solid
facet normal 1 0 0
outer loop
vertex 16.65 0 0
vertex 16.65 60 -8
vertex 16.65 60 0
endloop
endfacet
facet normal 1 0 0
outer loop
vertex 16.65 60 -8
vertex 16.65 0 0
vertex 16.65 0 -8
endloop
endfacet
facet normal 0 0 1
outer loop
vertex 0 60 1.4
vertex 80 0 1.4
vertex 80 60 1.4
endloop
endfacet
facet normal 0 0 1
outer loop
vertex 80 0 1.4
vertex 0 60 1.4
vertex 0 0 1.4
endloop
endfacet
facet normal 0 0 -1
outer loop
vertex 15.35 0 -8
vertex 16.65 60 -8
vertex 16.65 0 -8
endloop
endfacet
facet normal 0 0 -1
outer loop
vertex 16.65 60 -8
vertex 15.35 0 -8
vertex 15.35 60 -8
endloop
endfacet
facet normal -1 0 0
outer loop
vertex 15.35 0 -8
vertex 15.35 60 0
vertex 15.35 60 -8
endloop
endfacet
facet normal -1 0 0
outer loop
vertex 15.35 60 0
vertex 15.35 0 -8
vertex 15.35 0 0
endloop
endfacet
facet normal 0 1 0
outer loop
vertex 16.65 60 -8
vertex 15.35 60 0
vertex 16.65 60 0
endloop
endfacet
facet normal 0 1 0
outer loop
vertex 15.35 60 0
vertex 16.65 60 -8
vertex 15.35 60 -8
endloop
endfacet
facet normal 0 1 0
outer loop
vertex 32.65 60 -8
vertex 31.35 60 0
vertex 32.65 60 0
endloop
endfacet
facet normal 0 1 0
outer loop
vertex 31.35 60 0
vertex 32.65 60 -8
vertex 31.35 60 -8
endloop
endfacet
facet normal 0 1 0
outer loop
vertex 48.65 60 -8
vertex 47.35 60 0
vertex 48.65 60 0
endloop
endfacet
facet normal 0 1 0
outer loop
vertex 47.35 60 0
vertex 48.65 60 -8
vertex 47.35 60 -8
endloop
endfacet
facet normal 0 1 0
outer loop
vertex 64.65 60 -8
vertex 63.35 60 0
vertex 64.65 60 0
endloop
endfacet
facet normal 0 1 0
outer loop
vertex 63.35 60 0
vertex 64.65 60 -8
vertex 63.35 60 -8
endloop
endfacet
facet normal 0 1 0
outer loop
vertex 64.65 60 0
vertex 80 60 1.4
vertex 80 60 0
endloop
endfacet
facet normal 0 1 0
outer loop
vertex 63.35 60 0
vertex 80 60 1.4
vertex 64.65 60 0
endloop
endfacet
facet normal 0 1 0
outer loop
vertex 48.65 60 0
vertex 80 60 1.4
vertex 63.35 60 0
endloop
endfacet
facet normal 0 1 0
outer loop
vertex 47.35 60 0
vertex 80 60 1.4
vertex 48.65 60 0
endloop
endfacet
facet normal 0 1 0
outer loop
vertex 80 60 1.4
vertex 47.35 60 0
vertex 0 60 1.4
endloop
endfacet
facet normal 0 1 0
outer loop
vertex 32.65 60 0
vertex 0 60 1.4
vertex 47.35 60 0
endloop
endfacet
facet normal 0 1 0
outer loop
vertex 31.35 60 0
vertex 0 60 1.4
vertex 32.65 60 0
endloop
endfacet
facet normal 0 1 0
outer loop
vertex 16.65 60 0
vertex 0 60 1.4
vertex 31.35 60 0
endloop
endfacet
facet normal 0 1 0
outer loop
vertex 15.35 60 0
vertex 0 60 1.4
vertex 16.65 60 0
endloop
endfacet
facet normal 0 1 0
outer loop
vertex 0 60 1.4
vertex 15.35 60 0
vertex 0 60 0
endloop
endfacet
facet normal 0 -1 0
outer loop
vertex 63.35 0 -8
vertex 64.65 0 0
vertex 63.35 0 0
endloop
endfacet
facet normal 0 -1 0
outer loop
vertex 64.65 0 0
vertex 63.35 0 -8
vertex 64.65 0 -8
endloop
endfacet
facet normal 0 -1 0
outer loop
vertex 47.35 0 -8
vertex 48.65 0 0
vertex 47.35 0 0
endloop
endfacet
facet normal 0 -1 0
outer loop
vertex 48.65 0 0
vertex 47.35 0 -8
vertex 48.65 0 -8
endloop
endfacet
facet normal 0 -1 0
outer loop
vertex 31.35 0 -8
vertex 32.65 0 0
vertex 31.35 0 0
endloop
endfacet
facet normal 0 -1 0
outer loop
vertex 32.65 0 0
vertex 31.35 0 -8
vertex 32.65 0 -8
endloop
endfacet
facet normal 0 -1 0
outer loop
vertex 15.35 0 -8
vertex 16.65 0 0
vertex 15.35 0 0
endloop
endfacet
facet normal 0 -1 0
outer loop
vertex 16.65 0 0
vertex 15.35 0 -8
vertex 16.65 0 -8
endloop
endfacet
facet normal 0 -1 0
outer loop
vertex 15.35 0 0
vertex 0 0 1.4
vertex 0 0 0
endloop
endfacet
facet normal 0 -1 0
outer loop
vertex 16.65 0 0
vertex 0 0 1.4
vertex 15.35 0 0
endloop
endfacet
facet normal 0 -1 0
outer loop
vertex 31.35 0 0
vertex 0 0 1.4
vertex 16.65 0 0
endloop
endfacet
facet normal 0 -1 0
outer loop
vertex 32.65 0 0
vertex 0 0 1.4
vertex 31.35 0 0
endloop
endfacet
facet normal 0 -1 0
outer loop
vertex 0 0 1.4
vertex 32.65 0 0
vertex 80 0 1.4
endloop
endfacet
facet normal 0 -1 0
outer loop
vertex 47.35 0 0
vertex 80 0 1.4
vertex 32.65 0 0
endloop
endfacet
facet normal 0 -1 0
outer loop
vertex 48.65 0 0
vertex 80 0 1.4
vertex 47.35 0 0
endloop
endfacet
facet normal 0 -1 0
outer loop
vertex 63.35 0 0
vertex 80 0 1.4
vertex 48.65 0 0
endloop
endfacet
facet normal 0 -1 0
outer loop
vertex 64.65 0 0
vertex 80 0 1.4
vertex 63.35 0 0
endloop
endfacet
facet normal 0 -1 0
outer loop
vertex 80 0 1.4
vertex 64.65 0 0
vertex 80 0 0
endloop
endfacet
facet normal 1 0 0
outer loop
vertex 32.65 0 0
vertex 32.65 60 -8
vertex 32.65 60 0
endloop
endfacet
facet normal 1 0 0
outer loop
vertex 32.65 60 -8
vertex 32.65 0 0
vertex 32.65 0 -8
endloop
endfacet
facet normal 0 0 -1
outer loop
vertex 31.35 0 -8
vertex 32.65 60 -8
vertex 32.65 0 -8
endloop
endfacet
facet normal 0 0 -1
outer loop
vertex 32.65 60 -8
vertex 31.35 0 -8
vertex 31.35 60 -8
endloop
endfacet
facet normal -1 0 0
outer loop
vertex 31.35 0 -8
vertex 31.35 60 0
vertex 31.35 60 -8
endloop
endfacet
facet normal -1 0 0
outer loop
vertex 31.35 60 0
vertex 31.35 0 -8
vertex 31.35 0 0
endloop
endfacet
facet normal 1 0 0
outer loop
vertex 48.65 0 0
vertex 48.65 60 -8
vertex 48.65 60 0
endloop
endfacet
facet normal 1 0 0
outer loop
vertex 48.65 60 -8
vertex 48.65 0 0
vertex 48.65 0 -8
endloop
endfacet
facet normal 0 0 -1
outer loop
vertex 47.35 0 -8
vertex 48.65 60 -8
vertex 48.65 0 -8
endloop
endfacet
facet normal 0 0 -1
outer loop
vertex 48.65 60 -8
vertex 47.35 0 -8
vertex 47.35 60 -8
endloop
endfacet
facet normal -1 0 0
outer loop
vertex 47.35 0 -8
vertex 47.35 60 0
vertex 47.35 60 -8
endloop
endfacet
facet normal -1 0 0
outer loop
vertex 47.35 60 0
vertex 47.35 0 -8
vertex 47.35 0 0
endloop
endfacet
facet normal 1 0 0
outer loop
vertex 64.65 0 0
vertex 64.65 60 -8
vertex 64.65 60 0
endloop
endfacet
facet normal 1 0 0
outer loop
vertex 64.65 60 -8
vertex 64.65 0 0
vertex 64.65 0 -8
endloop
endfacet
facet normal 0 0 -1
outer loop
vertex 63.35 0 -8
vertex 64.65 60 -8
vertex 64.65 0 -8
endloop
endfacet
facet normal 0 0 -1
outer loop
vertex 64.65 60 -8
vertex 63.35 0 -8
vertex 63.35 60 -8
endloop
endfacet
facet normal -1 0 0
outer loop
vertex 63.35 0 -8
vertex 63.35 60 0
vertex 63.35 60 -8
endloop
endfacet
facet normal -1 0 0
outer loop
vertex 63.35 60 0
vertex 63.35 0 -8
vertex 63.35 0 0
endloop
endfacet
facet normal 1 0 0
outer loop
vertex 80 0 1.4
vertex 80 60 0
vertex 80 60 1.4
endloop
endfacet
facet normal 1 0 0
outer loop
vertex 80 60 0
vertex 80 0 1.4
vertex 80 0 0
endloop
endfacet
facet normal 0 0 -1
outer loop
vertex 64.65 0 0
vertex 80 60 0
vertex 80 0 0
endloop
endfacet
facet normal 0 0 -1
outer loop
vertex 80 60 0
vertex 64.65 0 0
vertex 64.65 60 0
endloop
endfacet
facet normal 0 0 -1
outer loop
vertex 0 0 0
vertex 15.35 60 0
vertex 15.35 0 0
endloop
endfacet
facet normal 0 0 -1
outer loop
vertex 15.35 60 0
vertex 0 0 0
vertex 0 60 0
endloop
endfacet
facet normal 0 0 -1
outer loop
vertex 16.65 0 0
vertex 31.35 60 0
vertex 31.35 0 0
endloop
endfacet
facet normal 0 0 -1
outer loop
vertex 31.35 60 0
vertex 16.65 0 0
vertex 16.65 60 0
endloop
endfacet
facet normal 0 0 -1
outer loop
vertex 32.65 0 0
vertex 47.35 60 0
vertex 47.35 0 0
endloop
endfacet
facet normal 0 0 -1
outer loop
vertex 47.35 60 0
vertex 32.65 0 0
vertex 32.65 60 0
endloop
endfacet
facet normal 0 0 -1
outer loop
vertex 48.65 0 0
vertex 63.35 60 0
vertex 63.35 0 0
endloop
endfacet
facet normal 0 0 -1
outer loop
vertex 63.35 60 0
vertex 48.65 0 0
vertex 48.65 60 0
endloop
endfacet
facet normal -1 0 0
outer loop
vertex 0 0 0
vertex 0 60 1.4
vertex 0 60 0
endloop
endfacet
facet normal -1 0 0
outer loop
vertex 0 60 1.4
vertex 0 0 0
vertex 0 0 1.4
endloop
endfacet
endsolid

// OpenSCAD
$fn = 32;

// ----------------------------------------------------------------------
// Ribbed panel: 1.4 mm panel
// ----------------------------------------------------------------------

// --- parameters (mm) ---
panel_l = 80;             // panel length, X
panel_w = 60;             // panel width, Y
panel_t = 1.4;            // panel thickness, Z
rib_t = 1.3;              // rib thickness
rib_h = 8;                // rib height below the panel
ribs = 4;                 // number of ribs

total_h = panel_t + rib_h;  // overall height

union() {
  cube([panel_l, panel_w, panel_t]);
  for (i = [1 : ribs])
    translate([i * panel_l / (ribs + 1) - rib_t / 2, 0, -rib_h])
      cube([rib_t, panel_w, rib_h + panel_t]);
}
